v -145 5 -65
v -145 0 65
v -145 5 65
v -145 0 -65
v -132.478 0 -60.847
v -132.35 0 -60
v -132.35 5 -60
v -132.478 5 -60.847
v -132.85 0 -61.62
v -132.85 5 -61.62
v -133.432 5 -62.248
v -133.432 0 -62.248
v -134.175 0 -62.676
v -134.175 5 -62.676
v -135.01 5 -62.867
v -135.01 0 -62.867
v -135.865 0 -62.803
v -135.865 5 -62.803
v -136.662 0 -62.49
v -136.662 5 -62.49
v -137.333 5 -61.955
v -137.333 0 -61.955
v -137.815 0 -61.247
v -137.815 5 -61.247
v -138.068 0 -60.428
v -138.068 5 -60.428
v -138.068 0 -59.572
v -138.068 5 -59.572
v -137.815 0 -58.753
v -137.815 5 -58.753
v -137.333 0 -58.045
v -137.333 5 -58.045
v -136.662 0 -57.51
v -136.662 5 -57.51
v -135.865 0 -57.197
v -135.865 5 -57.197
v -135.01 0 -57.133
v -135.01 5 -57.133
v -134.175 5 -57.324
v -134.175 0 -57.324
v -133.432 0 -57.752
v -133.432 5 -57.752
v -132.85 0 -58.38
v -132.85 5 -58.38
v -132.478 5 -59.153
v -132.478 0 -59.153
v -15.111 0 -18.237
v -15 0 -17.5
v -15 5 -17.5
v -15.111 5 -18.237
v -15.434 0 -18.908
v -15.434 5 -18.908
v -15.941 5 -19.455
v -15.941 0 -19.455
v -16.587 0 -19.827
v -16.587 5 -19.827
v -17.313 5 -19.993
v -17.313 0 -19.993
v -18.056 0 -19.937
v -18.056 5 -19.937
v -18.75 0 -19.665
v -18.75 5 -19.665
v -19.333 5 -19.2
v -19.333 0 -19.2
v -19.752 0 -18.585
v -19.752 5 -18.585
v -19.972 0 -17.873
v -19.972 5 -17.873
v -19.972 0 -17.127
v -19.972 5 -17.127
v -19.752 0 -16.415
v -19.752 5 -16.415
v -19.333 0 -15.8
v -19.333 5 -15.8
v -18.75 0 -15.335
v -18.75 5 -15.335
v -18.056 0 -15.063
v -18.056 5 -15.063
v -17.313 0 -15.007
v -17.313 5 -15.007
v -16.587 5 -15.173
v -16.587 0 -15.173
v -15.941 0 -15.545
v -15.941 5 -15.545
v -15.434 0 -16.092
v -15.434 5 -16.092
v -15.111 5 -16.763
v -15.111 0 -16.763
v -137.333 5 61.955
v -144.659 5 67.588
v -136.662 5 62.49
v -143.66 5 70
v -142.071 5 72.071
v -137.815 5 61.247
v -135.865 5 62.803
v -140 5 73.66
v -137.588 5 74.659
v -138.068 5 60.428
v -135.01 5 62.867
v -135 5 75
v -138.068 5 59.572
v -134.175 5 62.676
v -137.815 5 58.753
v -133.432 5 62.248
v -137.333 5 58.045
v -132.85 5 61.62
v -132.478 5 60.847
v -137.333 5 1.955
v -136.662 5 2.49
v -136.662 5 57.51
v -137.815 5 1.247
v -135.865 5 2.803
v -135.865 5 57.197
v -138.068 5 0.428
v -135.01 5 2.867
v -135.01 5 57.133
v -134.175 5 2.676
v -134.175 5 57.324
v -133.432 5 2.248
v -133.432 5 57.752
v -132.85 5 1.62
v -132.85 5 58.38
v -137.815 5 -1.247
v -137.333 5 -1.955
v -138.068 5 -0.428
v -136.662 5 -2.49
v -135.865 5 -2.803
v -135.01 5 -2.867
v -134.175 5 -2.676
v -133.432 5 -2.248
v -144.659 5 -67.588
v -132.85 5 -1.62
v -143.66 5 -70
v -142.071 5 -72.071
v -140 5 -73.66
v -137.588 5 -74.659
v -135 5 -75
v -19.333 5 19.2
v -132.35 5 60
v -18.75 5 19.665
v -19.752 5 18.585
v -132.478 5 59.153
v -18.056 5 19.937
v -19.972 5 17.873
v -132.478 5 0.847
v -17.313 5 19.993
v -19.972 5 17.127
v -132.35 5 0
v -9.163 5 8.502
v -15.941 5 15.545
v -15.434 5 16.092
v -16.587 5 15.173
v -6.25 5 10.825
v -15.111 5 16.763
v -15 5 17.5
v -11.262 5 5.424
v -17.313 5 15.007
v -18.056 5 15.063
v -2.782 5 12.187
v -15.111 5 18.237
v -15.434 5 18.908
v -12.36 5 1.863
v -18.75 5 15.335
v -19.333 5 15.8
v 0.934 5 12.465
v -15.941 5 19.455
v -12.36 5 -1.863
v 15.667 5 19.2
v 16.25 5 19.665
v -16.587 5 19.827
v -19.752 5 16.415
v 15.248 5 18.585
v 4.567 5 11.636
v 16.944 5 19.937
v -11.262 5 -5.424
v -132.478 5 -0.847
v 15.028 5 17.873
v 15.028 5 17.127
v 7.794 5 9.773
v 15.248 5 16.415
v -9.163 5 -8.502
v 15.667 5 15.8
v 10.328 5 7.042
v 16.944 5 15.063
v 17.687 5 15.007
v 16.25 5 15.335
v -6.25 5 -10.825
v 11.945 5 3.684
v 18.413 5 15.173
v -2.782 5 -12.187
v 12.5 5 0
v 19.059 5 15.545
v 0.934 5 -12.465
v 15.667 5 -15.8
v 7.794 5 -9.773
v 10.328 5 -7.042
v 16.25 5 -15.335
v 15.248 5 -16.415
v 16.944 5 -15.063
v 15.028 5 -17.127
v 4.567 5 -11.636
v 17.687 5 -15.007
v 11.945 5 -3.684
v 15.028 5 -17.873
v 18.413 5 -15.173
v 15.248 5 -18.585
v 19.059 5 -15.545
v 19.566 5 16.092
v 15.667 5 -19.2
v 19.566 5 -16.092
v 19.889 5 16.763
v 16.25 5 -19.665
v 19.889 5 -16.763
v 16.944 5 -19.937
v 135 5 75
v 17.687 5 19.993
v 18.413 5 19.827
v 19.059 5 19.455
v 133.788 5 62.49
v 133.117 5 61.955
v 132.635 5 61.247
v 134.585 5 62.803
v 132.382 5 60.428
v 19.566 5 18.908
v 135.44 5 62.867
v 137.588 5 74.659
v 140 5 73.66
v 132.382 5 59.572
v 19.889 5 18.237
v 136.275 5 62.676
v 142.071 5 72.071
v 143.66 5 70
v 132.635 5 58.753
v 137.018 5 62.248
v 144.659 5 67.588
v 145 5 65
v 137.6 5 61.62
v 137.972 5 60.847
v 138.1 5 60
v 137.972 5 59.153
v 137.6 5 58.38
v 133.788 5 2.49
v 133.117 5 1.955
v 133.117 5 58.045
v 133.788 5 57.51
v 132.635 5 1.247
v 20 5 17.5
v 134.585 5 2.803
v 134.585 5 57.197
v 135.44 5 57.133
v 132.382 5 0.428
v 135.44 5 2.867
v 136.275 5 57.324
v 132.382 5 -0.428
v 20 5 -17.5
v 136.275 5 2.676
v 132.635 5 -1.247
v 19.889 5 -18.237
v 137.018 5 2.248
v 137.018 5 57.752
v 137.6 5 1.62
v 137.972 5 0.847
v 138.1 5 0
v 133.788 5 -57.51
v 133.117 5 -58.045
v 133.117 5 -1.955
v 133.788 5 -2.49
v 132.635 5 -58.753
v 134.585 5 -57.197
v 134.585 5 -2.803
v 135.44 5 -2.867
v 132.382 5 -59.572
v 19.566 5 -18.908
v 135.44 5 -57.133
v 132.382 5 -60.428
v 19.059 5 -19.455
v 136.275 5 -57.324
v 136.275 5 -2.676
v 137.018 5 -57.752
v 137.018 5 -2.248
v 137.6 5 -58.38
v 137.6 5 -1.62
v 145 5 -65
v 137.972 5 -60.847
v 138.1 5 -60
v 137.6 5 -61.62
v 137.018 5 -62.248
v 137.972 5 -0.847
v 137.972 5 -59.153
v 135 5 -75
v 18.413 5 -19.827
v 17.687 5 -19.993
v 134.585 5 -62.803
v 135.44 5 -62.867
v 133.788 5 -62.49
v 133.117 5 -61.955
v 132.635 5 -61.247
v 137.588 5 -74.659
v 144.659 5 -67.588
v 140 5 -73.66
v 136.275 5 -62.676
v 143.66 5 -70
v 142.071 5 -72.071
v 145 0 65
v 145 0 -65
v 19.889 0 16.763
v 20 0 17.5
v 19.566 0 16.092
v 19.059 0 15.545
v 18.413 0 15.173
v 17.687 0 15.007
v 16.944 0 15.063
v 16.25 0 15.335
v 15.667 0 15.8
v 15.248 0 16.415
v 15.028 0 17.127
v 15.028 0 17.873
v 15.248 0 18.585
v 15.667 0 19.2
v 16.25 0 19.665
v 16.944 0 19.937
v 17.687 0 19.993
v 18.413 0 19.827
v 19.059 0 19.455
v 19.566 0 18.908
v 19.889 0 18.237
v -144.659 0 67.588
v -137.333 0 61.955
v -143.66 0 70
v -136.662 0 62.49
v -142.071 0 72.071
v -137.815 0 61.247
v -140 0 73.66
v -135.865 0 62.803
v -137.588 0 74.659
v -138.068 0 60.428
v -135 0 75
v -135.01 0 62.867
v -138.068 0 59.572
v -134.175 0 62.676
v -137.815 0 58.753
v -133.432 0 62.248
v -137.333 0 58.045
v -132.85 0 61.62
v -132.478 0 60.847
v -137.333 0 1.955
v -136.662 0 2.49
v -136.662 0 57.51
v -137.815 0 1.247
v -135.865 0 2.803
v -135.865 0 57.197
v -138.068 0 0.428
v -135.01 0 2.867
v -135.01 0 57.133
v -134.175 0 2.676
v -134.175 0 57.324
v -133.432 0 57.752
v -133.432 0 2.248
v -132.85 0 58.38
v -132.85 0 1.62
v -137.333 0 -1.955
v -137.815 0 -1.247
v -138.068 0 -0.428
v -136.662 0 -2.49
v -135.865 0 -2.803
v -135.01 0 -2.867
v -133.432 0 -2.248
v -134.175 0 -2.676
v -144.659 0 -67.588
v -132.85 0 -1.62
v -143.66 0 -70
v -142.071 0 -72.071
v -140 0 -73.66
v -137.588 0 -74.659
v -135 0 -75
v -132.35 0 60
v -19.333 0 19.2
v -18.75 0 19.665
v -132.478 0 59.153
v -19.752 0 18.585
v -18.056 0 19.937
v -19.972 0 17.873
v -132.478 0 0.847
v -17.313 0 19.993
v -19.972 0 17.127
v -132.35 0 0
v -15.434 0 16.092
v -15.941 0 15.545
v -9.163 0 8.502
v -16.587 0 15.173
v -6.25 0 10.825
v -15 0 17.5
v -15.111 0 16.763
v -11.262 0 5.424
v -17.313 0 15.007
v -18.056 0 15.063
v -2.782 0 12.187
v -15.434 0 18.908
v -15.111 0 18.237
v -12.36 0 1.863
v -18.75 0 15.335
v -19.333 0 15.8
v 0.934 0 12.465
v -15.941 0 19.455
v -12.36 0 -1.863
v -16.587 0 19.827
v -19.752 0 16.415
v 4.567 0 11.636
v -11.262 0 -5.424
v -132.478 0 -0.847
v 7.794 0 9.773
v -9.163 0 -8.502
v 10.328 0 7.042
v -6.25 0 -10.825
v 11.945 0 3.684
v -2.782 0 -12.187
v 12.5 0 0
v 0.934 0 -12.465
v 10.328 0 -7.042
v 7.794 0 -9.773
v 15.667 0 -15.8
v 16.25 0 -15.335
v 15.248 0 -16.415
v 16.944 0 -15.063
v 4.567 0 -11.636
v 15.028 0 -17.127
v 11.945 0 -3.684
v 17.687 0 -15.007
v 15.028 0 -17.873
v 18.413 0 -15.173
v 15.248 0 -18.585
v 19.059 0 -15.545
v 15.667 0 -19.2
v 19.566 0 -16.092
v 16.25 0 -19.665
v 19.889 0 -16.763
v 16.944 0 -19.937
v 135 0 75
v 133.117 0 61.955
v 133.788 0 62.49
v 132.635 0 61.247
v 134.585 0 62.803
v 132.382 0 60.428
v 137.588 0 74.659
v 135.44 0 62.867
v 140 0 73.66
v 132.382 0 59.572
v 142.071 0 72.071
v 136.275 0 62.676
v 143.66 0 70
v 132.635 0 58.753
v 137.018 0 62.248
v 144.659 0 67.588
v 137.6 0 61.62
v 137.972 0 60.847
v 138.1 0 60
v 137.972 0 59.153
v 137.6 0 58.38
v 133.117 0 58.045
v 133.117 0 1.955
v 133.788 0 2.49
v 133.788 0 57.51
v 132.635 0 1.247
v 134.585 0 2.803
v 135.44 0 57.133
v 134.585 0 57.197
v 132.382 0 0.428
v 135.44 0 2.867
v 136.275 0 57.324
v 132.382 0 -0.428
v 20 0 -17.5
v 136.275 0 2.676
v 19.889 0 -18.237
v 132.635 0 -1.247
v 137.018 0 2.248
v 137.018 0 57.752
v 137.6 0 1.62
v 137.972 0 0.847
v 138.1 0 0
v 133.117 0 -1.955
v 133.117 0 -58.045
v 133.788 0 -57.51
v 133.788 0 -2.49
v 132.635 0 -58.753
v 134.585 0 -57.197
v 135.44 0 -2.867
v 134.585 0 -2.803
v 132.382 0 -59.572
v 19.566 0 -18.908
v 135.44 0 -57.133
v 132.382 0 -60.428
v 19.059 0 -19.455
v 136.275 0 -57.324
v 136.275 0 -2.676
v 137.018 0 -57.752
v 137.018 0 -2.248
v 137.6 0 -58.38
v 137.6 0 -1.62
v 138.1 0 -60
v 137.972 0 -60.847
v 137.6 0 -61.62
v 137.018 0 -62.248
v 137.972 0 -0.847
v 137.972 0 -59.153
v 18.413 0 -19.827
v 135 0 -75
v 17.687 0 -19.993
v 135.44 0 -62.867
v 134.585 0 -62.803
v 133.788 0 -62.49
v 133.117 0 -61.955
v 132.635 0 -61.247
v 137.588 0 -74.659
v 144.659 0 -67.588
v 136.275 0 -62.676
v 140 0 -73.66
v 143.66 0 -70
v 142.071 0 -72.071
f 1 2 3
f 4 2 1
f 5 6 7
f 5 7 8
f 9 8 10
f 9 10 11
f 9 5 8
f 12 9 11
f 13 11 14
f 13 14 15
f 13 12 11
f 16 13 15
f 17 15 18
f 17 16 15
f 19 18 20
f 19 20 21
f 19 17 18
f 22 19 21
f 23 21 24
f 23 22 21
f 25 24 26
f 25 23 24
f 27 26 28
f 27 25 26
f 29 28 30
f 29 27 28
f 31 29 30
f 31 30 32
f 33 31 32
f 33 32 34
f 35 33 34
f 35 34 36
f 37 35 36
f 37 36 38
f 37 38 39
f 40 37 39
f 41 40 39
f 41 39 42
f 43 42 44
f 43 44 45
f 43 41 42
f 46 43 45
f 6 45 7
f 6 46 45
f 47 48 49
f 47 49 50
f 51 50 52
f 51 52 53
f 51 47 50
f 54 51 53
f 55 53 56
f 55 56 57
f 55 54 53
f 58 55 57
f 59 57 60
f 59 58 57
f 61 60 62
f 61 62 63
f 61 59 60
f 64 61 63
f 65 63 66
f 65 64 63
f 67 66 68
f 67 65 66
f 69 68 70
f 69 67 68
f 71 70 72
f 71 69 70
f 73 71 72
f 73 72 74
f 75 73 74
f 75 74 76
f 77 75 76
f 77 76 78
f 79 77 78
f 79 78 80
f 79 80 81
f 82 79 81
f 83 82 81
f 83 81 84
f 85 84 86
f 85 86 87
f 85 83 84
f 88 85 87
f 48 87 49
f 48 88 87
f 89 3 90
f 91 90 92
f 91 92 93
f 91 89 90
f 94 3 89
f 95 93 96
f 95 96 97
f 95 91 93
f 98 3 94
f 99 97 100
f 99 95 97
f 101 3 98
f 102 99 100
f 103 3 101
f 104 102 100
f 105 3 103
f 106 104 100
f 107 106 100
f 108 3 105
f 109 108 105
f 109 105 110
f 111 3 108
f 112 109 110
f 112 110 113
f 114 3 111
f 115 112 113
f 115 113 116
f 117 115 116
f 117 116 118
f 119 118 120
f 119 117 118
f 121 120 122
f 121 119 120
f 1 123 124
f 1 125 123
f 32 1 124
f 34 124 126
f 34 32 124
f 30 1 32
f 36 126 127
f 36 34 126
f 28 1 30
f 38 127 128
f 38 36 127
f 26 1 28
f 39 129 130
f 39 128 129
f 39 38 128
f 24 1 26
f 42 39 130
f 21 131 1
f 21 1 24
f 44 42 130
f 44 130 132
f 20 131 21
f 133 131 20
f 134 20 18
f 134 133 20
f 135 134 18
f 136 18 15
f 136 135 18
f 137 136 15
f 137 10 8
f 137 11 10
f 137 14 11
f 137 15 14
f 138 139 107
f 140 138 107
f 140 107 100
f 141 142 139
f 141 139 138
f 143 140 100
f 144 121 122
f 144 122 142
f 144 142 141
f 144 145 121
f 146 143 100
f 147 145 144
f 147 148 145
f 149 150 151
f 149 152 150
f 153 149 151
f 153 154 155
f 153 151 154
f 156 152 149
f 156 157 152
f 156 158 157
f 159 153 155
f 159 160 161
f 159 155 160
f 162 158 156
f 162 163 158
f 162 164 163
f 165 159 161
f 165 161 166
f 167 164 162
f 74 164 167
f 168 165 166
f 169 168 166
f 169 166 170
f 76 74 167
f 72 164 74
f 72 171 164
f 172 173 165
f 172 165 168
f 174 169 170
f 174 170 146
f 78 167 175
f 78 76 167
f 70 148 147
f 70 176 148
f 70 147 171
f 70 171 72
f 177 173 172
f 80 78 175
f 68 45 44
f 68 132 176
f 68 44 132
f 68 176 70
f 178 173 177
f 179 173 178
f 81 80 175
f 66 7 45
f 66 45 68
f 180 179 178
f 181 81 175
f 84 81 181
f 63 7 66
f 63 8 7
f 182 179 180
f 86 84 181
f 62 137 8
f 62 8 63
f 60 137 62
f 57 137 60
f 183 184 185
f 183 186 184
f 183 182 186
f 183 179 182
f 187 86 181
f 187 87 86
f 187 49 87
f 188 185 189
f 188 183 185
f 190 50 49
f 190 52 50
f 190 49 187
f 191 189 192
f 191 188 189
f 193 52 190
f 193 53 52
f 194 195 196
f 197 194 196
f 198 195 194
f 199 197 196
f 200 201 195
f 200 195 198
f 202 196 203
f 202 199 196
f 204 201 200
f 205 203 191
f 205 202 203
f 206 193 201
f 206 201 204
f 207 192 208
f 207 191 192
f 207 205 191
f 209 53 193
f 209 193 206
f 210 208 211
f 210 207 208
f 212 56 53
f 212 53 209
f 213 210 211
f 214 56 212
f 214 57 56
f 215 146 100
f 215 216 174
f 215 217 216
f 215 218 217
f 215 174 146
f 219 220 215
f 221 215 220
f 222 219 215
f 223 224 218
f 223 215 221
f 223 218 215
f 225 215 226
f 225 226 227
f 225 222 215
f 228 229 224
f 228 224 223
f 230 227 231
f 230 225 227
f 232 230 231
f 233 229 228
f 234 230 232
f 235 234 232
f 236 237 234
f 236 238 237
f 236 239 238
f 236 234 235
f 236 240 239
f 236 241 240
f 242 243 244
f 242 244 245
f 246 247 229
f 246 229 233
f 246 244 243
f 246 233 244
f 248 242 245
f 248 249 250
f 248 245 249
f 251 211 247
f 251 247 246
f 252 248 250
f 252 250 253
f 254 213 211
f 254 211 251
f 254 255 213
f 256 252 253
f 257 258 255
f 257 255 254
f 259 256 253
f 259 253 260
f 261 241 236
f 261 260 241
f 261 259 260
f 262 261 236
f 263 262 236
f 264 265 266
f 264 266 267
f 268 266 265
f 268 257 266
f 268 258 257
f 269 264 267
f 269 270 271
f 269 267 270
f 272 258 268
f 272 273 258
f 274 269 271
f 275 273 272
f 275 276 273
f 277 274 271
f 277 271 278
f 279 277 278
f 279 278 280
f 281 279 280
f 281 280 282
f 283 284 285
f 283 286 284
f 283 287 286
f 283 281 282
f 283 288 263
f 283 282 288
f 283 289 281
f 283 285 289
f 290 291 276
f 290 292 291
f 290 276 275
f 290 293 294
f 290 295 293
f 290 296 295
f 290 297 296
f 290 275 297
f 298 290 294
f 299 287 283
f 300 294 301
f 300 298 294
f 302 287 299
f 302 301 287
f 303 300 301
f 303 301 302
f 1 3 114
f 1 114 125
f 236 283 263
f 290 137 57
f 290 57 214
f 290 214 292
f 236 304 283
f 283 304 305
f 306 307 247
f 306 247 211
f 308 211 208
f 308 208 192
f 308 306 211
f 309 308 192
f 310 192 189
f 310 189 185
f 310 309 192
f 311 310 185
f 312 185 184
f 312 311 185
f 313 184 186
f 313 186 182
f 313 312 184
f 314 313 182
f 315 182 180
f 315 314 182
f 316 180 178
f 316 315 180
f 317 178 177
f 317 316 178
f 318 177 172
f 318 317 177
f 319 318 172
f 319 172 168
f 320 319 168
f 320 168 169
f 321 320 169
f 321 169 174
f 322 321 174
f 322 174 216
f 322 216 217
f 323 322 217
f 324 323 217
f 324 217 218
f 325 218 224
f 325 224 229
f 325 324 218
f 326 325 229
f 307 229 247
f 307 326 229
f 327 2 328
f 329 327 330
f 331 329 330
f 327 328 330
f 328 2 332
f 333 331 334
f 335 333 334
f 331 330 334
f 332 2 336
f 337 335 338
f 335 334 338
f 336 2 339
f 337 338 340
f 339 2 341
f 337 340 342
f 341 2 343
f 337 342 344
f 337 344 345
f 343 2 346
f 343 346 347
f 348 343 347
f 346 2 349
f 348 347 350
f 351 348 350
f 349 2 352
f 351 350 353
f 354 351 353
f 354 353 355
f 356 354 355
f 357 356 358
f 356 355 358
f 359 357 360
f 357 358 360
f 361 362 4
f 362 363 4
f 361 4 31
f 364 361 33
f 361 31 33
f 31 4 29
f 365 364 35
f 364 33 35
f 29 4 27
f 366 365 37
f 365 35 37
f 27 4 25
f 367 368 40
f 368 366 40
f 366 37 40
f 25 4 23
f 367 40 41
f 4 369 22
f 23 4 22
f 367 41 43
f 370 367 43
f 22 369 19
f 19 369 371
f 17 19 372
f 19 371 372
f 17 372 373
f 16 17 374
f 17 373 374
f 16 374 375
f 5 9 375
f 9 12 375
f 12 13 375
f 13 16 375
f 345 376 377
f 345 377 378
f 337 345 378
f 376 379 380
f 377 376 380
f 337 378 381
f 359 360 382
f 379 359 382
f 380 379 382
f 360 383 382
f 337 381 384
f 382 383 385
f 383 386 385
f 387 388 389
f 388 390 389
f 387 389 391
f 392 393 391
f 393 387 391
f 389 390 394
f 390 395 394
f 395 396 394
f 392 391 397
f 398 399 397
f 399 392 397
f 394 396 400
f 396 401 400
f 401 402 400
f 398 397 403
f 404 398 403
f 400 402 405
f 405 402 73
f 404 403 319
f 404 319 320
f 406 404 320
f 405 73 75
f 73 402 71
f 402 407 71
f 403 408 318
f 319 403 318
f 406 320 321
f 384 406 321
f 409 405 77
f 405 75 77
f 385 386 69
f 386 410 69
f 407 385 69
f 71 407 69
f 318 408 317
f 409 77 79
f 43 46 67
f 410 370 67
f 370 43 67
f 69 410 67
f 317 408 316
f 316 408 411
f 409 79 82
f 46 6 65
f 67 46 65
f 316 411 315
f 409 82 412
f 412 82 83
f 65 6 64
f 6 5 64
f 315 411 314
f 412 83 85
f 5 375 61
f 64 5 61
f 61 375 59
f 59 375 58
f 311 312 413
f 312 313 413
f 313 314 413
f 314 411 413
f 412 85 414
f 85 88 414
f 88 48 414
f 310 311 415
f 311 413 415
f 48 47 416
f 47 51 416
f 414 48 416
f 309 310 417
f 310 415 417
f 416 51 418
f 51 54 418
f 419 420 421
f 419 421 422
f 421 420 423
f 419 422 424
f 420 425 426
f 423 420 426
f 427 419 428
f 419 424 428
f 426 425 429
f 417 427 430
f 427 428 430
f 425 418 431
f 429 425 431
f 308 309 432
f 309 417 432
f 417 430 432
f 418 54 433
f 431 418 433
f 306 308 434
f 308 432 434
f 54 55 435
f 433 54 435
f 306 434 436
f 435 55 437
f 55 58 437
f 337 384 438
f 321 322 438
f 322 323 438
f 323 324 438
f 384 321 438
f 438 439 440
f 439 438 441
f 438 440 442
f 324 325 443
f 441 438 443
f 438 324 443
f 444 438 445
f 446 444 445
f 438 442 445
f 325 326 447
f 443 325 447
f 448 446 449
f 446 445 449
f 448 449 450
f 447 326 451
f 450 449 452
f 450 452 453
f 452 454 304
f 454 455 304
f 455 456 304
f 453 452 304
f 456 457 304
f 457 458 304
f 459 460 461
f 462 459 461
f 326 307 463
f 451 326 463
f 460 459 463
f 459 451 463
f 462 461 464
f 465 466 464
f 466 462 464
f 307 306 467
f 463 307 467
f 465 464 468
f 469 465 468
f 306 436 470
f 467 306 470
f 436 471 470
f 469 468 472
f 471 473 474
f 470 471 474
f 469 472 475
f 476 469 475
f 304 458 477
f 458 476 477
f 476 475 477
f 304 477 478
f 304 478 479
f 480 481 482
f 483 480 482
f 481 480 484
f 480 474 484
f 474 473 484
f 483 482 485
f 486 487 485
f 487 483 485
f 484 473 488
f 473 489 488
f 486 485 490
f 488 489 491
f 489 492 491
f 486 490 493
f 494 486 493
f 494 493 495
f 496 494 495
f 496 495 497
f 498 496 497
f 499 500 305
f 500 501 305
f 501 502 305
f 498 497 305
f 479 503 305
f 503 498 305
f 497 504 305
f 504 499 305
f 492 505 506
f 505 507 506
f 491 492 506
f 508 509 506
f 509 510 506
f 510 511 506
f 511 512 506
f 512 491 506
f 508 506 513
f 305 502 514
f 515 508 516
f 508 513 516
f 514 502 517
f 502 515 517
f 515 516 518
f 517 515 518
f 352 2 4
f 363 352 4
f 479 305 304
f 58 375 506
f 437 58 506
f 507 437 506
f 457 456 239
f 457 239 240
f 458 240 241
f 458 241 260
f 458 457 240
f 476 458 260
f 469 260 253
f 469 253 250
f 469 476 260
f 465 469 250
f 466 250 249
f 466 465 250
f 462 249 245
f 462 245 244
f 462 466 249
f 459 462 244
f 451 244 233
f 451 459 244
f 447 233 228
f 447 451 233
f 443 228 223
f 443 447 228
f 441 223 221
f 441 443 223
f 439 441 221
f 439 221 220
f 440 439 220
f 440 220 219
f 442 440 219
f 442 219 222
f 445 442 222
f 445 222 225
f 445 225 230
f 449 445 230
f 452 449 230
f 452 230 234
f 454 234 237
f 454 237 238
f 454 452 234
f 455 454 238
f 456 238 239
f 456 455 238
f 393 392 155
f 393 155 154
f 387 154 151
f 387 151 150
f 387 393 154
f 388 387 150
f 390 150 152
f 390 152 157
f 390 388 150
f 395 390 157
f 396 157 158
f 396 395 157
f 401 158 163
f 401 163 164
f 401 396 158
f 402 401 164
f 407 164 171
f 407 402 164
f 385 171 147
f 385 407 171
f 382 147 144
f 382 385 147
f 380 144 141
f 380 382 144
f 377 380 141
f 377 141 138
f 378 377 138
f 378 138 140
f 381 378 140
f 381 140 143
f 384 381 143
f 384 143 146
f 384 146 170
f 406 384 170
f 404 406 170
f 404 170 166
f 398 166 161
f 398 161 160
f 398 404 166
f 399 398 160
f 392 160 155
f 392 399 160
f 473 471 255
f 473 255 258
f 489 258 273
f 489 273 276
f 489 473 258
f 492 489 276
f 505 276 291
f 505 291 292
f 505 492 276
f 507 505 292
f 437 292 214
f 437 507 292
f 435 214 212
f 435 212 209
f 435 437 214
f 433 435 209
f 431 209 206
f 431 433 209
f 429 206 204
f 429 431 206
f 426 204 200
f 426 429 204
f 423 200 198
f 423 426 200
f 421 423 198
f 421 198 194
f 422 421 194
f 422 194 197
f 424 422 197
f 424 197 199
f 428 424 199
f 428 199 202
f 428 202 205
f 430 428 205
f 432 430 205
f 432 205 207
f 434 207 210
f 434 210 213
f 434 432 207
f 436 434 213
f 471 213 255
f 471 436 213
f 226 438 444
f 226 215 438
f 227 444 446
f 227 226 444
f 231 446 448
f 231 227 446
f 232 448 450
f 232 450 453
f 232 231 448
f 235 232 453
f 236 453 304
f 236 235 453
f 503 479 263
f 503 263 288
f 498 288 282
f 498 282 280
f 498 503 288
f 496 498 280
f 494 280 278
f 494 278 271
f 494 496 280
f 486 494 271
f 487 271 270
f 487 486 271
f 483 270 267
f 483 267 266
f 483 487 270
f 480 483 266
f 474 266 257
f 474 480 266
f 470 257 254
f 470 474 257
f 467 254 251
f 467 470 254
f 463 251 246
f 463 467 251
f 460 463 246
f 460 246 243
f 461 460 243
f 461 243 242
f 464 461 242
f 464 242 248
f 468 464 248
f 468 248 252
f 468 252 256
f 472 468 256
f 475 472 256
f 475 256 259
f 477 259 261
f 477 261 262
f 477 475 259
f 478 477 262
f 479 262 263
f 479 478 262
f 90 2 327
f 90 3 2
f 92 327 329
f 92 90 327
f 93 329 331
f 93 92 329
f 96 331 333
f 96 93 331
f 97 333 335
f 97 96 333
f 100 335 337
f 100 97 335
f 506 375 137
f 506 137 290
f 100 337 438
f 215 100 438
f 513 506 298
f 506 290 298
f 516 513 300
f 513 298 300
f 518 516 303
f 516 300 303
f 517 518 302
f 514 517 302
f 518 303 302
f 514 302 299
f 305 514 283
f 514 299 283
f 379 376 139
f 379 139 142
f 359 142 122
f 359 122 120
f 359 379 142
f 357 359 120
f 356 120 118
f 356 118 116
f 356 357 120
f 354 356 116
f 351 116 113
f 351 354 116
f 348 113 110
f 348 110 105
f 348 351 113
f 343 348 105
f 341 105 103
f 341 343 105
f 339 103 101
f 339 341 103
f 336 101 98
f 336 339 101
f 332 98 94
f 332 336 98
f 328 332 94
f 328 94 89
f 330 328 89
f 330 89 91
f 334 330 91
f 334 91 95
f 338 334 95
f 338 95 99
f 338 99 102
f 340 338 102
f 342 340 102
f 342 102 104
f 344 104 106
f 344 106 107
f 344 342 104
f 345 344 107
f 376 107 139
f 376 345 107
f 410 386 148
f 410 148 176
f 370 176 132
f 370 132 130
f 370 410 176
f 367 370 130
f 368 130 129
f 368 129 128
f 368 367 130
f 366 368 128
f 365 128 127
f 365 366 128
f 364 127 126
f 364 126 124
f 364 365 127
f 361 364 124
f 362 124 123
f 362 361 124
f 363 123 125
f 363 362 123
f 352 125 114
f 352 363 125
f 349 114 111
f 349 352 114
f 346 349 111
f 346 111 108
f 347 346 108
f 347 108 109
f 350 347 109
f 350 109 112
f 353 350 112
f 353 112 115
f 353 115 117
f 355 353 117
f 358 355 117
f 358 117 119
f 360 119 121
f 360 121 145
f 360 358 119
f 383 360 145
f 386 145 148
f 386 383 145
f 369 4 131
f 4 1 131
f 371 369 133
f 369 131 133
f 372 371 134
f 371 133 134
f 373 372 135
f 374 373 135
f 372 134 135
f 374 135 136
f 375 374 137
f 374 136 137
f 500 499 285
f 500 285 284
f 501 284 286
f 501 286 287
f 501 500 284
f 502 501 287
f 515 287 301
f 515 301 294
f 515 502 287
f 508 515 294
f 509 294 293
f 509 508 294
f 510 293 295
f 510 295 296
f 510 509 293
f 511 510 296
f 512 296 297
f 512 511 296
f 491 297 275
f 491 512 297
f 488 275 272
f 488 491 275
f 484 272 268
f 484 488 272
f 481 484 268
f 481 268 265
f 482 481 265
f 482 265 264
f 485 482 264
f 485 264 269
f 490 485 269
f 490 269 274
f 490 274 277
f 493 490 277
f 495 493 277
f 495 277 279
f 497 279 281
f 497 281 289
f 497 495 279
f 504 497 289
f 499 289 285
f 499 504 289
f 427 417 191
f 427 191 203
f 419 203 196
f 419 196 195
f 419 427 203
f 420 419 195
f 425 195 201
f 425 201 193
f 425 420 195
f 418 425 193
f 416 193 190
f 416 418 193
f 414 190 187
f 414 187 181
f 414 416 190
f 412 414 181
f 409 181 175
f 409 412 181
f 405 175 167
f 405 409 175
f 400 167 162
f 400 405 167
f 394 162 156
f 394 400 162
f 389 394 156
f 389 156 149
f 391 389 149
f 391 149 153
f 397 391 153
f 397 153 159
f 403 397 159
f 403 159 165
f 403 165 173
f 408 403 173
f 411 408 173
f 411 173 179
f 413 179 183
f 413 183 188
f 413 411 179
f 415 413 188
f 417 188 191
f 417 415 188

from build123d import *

# Parameters (mm, degrees)
SKETCH1_W           = 290
SKETCH1_H           = 150
SKETCH1_R           = 2.875
SKETCH1_R_2         = 12.5
SKETCH1_R_3         = 2.5
BOSS_EXTRUDE2_DEPTH = 5
FILLET1_R           = 10


with BuildPart() as part:
    # Sketch1 → Boss-Extrude2 (new body)
    with BuildSketch(Plane(origin=(0, 0, 0), x_dir=(1, 0, 0), z_dir=(0, 1, 0))):
        Rectangle(SKETCH1_W, SKETCH1_H)
        with Locations((-135.225, 0)):
            Circle(SKETCH1_R, mode=Mode.SUBTRACT)
        with Locations((135.225, 0)):
            Circle(SKETCH1_R, mode=Mode.SUBTRACT)
        with Locations((135.225, 60)):
            Circle(SKETCH1_R, mode=Mode.SUBTRACT)
        with Locations((-135.225, 60)):
            Circle(SKETCH1_R, mode=Mode.SUBTRACT)
        with Locations((-135.225, -60)):
            Circle(SKETCH1_R, mode=Mode.SUBTRACT)
        with Locations((135.225, -60)):
            Circle(SKETCH1_R, mode=Mode.SUBTRACT)
        Circle(SKETCH1_R_2, mode=Mode.SUBTRACT)
        with Locations((-17.5, 17.5)):
            Circle(SKETCH1_R_3, mode=Mode.SUBTRACT)
        with Locations((17.5, 17.5)):
            Circle(SKETCH1_R_3, mode=Mode.SUBTRACT)
        with Locations((17.5, -17.5)):
            Circle(SKETCH1_R_3, mode=Mode.SUBTRACT)
        with Locations((-17.5, -17.5)):
            Circle(SKETCH1_R_3, mode=Mode.SUBTRACT)
    extrude(amount=BOSS_EXTRUDE2_DEPTH)

    # Fillet1
    fillet1_edges = [part.edges().sort_by_distance(p)[0] for p in [
        (-145, 2.5, -75),
        (145, 2.5, -75),
        (145, 2.5, 75),
        (-145, 2.5, 75),
    ]]
    fillet(fillet1_edges, radius=FILLET1_R)


solid = part.part
